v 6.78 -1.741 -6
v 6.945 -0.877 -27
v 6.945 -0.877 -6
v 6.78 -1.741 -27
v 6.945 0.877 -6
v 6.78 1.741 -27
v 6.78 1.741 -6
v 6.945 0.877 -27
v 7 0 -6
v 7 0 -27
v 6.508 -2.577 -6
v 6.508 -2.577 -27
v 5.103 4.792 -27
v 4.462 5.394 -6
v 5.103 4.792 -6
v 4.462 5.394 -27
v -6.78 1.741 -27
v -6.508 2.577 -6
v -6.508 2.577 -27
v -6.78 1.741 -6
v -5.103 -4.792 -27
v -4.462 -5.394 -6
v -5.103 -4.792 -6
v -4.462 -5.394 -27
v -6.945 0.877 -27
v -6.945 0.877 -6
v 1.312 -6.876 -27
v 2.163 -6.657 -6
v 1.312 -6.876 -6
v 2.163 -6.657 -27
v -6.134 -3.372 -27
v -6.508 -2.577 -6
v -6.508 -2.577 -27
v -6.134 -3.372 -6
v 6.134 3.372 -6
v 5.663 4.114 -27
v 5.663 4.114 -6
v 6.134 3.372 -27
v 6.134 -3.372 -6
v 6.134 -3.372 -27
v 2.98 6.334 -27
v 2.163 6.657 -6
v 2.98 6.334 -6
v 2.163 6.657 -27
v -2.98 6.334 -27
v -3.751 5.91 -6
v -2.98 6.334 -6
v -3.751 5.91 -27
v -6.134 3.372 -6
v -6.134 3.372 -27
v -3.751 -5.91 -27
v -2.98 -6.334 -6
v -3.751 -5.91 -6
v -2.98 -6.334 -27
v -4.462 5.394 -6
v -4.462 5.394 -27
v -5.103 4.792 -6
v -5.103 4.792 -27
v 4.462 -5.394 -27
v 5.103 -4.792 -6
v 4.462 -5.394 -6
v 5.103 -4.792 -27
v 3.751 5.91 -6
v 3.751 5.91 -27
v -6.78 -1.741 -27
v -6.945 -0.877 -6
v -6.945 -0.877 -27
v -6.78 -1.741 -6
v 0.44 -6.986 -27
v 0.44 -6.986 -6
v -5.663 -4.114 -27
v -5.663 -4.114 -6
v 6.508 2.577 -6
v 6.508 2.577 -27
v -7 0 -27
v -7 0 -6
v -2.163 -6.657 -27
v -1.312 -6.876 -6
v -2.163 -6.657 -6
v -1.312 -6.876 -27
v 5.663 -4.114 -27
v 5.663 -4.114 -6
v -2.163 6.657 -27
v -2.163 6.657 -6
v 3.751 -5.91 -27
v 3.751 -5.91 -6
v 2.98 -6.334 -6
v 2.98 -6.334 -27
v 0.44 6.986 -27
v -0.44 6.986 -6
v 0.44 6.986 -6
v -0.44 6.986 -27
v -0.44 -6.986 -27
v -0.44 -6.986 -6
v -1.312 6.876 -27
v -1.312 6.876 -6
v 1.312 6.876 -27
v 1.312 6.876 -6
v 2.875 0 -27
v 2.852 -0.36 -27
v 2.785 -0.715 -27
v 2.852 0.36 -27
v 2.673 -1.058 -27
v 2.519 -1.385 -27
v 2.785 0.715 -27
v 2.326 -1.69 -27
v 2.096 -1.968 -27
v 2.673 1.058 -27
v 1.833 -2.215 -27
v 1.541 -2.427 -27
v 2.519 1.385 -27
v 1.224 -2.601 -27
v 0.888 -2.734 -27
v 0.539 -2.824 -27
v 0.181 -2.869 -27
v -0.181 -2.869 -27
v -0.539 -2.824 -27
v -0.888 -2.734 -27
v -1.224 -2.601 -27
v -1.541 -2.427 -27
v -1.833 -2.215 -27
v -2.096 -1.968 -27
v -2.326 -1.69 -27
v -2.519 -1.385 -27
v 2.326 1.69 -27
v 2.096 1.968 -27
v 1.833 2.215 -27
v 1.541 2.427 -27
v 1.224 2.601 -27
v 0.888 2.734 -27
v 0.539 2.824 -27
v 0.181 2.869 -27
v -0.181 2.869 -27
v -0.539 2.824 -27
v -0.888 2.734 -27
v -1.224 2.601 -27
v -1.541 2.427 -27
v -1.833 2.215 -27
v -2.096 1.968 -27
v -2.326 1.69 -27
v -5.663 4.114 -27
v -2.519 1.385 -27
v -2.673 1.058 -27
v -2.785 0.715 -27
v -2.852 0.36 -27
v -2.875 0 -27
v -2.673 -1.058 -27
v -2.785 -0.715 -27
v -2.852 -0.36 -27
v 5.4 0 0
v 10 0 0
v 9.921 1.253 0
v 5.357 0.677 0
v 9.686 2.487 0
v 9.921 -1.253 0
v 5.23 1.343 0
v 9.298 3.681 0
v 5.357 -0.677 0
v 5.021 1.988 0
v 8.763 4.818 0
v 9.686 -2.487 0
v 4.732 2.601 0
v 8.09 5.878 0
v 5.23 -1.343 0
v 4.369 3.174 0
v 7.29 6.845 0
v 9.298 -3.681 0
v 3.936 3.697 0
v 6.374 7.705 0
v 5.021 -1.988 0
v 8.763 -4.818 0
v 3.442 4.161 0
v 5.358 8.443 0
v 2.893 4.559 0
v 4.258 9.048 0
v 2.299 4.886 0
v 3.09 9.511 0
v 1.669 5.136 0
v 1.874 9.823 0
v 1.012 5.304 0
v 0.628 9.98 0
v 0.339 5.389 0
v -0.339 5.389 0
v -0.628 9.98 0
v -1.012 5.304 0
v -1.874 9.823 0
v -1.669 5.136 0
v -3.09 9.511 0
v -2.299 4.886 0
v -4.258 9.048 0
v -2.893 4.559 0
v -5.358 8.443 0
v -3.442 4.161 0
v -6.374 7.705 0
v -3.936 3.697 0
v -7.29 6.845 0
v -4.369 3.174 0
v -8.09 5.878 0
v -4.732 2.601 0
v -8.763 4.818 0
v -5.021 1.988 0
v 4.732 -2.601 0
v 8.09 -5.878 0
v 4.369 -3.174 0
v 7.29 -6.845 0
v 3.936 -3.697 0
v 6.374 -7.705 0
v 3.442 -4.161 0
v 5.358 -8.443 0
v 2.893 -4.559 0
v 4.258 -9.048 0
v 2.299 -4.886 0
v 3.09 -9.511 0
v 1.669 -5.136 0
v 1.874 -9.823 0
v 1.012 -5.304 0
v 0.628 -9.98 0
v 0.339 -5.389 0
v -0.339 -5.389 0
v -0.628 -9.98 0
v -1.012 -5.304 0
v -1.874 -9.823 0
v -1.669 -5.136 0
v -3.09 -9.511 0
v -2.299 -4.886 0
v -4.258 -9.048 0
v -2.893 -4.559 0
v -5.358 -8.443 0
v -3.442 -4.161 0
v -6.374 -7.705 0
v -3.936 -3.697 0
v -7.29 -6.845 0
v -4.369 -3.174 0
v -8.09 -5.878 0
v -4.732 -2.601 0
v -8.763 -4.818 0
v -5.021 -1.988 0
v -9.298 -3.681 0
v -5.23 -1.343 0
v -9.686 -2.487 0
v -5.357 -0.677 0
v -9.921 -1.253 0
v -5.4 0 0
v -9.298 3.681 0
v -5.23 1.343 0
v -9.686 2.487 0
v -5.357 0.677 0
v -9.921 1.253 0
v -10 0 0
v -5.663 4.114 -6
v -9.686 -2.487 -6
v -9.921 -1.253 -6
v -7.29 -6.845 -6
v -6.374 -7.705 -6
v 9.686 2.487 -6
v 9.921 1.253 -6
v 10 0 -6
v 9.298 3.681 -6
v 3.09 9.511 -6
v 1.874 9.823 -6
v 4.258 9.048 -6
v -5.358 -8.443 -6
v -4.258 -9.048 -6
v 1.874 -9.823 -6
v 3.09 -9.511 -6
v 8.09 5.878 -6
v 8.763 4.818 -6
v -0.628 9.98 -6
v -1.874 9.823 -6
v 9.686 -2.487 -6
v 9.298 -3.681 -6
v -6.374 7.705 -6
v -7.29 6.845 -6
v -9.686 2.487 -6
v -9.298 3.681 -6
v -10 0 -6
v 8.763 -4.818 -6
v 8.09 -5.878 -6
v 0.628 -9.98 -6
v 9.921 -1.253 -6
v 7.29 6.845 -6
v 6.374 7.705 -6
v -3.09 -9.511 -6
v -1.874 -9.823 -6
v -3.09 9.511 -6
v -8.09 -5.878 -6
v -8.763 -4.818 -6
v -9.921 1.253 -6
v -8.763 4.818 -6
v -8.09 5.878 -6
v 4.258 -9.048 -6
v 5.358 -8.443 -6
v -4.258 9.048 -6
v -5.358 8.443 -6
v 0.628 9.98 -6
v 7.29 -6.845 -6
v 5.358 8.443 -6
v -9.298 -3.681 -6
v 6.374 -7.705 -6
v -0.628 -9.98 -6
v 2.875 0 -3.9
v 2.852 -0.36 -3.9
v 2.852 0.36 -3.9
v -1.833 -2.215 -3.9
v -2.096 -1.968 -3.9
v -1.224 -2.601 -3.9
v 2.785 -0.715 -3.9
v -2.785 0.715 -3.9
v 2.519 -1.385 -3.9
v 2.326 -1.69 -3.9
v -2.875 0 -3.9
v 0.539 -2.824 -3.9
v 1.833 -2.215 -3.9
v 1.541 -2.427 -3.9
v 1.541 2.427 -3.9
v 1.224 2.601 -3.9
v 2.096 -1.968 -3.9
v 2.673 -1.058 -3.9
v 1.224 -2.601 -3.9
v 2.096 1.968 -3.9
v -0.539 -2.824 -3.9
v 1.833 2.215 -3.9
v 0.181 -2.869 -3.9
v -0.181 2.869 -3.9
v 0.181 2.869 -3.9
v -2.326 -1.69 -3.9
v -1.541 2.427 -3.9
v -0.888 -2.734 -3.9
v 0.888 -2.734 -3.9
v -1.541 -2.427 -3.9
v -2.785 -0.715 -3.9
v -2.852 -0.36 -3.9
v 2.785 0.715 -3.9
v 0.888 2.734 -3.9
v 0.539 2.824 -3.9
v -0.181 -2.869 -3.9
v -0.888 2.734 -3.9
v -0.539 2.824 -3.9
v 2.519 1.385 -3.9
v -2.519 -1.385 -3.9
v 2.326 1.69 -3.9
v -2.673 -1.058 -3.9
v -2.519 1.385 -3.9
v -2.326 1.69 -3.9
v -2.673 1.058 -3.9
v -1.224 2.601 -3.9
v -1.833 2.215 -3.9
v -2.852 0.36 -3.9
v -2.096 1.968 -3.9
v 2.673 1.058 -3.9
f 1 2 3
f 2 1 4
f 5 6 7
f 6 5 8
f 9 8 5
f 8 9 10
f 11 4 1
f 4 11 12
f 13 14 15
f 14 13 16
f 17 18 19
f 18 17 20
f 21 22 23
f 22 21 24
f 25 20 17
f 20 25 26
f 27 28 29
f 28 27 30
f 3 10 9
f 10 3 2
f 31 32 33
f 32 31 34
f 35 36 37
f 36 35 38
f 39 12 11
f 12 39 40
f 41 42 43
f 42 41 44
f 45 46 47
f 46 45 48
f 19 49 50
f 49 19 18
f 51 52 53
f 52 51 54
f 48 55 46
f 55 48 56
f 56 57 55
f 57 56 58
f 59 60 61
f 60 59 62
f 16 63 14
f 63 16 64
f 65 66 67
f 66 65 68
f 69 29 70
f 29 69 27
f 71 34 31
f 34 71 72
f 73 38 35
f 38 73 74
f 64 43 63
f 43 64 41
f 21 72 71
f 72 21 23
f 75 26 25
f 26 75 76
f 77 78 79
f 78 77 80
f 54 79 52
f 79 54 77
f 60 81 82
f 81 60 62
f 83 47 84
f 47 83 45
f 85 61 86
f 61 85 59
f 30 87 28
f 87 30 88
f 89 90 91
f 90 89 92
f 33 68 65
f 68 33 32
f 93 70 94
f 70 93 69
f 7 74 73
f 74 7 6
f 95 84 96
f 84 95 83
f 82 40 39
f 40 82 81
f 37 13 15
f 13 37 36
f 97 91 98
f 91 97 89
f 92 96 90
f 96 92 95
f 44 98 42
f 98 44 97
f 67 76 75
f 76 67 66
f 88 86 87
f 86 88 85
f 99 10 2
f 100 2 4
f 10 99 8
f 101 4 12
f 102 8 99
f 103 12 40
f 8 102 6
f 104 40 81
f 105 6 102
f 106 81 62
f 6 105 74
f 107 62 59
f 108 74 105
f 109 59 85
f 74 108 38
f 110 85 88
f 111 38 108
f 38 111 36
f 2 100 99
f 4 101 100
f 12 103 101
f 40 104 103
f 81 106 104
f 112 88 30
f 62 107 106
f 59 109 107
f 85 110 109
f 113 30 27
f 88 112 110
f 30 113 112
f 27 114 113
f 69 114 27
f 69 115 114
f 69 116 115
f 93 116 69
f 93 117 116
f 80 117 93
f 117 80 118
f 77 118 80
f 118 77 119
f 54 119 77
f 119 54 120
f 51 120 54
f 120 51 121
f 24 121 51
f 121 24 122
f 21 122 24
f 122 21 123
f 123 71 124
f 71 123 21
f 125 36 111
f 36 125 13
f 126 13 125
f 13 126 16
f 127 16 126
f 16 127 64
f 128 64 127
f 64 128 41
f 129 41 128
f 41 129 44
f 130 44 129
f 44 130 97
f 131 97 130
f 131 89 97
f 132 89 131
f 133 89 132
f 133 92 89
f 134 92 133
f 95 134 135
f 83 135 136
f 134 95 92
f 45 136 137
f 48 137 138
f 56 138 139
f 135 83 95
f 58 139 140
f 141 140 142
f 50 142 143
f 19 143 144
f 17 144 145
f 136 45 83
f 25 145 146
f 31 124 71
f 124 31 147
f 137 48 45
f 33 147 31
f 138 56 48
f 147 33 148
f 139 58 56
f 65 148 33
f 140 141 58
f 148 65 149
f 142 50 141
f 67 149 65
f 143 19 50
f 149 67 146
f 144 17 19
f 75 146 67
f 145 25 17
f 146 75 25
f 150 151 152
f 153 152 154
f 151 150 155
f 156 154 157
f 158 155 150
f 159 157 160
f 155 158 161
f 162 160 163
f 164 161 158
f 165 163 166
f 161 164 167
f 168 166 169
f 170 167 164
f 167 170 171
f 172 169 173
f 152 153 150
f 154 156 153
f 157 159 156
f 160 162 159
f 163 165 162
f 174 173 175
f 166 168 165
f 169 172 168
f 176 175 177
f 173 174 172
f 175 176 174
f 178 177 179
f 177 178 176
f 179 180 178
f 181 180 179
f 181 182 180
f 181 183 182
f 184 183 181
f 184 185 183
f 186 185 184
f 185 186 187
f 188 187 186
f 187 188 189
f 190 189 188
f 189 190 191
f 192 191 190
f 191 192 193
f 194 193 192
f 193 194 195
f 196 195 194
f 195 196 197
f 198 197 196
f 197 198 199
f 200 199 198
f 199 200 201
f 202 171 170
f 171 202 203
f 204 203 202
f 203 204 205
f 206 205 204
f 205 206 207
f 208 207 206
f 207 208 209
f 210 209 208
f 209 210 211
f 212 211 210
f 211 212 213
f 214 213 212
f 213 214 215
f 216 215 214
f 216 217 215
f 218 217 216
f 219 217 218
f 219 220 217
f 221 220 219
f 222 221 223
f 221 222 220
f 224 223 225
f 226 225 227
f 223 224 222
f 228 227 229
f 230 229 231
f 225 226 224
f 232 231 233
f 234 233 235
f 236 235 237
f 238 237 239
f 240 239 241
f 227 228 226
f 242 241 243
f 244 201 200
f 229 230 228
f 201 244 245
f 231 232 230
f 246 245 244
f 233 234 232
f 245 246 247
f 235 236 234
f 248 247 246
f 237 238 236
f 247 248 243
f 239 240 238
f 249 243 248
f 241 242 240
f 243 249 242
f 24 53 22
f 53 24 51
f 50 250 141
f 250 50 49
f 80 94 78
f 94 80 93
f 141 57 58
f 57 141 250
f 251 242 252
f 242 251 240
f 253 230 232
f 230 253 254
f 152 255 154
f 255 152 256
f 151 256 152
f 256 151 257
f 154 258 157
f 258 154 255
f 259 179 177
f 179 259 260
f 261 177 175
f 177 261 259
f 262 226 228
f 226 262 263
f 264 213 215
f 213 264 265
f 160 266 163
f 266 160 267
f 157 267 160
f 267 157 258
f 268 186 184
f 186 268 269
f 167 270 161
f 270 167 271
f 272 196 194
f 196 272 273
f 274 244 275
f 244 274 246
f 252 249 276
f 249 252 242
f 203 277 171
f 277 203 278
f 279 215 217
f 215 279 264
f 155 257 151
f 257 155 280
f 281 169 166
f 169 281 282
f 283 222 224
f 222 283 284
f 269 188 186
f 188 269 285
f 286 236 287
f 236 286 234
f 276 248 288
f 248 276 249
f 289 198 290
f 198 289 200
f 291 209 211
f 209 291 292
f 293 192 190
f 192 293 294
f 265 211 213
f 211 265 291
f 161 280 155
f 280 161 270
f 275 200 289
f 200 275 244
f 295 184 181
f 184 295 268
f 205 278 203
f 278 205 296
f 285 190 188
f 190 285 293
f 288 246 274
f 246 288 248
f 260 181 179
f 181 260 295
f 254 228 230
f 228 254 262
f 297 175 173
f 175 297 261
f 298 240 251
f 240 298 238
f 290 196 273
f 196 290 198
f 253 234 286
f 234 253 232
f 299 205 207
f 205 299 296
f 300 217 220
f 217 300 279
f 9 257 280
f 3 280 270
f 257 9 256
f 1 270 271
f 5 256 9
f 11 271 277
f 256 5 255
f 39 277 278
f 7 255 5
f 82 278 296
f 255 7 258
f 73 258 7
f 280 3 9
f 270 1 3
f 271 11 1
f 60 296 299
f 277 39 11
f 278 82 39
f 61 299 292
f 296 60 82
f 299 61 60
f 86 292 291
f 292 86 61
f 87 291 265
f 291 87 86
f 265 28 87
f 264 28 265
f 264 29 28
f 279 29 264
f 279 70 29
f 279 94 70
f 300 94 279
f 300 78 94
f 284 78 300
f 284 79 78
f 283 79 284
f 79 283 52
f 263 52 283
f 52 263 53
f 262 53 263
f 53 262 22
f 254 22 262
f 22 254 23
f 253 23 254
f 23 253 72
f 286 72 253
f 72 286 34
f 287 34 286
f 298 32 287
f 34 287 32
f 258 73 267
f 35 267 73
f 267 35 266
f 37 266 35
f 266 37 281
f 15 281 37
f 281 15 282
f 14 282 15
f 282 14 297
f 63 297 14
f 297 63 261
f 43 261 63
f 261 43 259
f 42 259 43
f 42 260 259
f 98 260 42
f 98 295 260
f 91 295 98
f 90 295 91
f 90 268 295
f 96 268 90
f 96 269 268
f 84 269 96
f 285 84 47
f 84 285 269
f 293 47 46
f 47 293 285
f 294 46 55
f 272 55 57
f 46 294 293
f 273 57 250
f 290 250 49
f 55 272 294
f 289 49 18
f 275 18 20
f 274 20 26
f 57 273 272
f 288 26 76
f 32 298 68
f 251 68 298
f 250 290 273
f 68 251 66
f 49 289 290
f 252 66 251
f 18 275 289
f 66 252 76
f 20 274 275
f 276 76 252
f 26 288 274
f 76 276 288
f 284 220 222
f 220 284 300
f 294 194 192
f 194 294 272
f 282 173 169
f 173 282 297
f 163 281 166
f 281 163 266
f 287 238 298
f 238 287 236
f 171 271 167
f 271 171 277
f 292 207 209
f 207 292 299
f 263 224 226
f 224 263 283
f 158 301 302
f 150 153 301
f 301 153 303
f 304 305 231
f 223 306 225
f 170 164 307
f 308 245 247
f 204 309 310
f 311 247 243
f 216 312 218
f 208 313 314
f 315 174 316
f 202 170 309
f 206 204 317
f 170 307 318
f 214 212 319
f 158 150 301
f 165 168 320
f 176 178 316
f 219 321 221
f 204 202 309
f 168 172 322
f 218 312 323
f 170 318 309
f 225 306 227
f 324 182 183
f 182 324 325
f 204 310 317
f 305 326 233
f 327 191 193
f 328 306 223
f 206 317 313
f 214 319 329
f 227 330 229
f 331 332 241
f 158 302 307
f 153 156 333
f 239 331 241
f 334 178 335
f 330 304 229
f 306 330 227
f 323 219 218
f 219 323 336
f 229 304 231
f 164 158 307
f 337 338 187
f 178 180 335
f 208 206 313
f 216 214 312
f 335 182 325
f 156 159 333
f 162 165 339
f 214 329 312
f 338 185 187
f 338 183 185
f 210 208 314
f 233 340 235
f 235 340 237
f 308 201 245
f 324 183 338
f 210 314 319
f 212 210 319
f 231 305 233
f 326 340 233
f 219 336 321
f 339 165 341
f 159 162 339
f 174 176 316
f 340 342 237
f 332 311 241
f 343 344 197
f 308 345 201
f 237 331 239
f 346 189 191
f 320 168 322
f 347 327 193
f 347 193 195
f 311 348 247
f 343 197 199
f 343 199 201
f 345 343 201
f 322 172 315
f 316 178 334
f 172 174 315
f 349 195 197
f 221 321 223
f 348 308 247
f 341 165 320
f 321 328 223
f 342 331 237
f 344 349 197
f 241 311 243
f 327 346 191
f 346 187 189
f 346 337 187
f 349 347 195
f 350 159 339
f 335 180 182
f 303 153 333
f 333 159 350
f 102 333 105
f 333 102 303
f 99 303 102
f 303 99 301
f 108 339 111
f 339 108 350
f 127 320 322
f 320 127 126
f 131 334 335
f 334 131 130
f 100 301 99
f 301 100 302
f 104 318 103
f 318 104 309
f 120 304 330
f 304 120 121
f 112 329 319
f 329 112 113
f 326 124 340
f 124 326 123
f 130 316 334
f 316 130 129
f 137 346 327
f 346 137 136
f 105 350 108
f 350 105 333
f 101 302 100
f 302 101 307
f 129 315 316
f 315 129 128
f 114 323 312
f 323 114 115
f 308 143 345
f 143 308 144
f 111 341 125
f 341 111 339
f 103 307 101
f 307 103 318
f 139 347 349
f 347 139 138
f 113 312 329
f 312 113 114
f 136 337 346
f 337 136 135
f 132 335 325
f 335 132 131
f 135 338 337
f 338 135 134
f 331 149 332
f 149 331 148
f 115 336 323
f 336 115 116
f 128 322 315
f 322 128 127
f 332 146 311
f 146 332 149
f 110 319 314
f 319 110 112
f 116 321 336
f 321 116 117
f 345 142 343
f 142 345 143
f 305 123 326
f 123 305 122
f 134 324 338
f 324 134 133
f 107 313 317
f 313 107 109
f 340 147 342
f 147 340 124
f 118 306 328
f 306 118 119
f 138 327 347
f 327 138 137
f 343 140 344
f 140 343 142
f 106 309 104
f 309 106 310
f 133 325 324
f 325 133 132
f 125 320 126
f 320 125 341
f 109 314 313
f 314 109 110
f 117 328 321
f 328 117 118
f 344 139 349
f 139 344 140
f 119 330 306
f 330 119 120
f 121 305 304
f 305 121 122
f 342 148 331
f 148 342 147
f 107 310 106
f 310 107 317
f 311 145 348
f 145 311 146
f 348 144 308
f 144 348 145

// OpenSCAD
$fn = 50;


difference() {
	union() {
		translate(v = [0, 0, -27.0000000000]) {
			cylinder(h = 27, r = 7.0000000000);
		}
		translate(v = [0, 0, -6.0000000000]) {
			cylinder(h = 6, r = 10.0000000000);
		}
	}
	union() {
		translate(v = [0, 0, 0]) {
			rotate(a = [0, 0, 0]) {
				difference() {
					union() {
						#translate(v = [0, 0, -27.0000000000]) {
							cylinder(h = 27, r = 2.6000000000);
						}
						#translate(v = [0, 0, -3.9000000000]) {
							cylinder(h = 3.9000000000, r1 = 2.8750000000, r2 = 5.4000000000);
						}
						#translate(v = [0, 0, -27.0000000000]) {
							cylinder(h = 27, r = 2.8750000000);
						}
						#translate(v = [0, 0, -27.0000000000]) {
							cylinder(h = 27, r = 2.6000000000);
						}
					}
					union();
				}
			}
		}
	}
}
